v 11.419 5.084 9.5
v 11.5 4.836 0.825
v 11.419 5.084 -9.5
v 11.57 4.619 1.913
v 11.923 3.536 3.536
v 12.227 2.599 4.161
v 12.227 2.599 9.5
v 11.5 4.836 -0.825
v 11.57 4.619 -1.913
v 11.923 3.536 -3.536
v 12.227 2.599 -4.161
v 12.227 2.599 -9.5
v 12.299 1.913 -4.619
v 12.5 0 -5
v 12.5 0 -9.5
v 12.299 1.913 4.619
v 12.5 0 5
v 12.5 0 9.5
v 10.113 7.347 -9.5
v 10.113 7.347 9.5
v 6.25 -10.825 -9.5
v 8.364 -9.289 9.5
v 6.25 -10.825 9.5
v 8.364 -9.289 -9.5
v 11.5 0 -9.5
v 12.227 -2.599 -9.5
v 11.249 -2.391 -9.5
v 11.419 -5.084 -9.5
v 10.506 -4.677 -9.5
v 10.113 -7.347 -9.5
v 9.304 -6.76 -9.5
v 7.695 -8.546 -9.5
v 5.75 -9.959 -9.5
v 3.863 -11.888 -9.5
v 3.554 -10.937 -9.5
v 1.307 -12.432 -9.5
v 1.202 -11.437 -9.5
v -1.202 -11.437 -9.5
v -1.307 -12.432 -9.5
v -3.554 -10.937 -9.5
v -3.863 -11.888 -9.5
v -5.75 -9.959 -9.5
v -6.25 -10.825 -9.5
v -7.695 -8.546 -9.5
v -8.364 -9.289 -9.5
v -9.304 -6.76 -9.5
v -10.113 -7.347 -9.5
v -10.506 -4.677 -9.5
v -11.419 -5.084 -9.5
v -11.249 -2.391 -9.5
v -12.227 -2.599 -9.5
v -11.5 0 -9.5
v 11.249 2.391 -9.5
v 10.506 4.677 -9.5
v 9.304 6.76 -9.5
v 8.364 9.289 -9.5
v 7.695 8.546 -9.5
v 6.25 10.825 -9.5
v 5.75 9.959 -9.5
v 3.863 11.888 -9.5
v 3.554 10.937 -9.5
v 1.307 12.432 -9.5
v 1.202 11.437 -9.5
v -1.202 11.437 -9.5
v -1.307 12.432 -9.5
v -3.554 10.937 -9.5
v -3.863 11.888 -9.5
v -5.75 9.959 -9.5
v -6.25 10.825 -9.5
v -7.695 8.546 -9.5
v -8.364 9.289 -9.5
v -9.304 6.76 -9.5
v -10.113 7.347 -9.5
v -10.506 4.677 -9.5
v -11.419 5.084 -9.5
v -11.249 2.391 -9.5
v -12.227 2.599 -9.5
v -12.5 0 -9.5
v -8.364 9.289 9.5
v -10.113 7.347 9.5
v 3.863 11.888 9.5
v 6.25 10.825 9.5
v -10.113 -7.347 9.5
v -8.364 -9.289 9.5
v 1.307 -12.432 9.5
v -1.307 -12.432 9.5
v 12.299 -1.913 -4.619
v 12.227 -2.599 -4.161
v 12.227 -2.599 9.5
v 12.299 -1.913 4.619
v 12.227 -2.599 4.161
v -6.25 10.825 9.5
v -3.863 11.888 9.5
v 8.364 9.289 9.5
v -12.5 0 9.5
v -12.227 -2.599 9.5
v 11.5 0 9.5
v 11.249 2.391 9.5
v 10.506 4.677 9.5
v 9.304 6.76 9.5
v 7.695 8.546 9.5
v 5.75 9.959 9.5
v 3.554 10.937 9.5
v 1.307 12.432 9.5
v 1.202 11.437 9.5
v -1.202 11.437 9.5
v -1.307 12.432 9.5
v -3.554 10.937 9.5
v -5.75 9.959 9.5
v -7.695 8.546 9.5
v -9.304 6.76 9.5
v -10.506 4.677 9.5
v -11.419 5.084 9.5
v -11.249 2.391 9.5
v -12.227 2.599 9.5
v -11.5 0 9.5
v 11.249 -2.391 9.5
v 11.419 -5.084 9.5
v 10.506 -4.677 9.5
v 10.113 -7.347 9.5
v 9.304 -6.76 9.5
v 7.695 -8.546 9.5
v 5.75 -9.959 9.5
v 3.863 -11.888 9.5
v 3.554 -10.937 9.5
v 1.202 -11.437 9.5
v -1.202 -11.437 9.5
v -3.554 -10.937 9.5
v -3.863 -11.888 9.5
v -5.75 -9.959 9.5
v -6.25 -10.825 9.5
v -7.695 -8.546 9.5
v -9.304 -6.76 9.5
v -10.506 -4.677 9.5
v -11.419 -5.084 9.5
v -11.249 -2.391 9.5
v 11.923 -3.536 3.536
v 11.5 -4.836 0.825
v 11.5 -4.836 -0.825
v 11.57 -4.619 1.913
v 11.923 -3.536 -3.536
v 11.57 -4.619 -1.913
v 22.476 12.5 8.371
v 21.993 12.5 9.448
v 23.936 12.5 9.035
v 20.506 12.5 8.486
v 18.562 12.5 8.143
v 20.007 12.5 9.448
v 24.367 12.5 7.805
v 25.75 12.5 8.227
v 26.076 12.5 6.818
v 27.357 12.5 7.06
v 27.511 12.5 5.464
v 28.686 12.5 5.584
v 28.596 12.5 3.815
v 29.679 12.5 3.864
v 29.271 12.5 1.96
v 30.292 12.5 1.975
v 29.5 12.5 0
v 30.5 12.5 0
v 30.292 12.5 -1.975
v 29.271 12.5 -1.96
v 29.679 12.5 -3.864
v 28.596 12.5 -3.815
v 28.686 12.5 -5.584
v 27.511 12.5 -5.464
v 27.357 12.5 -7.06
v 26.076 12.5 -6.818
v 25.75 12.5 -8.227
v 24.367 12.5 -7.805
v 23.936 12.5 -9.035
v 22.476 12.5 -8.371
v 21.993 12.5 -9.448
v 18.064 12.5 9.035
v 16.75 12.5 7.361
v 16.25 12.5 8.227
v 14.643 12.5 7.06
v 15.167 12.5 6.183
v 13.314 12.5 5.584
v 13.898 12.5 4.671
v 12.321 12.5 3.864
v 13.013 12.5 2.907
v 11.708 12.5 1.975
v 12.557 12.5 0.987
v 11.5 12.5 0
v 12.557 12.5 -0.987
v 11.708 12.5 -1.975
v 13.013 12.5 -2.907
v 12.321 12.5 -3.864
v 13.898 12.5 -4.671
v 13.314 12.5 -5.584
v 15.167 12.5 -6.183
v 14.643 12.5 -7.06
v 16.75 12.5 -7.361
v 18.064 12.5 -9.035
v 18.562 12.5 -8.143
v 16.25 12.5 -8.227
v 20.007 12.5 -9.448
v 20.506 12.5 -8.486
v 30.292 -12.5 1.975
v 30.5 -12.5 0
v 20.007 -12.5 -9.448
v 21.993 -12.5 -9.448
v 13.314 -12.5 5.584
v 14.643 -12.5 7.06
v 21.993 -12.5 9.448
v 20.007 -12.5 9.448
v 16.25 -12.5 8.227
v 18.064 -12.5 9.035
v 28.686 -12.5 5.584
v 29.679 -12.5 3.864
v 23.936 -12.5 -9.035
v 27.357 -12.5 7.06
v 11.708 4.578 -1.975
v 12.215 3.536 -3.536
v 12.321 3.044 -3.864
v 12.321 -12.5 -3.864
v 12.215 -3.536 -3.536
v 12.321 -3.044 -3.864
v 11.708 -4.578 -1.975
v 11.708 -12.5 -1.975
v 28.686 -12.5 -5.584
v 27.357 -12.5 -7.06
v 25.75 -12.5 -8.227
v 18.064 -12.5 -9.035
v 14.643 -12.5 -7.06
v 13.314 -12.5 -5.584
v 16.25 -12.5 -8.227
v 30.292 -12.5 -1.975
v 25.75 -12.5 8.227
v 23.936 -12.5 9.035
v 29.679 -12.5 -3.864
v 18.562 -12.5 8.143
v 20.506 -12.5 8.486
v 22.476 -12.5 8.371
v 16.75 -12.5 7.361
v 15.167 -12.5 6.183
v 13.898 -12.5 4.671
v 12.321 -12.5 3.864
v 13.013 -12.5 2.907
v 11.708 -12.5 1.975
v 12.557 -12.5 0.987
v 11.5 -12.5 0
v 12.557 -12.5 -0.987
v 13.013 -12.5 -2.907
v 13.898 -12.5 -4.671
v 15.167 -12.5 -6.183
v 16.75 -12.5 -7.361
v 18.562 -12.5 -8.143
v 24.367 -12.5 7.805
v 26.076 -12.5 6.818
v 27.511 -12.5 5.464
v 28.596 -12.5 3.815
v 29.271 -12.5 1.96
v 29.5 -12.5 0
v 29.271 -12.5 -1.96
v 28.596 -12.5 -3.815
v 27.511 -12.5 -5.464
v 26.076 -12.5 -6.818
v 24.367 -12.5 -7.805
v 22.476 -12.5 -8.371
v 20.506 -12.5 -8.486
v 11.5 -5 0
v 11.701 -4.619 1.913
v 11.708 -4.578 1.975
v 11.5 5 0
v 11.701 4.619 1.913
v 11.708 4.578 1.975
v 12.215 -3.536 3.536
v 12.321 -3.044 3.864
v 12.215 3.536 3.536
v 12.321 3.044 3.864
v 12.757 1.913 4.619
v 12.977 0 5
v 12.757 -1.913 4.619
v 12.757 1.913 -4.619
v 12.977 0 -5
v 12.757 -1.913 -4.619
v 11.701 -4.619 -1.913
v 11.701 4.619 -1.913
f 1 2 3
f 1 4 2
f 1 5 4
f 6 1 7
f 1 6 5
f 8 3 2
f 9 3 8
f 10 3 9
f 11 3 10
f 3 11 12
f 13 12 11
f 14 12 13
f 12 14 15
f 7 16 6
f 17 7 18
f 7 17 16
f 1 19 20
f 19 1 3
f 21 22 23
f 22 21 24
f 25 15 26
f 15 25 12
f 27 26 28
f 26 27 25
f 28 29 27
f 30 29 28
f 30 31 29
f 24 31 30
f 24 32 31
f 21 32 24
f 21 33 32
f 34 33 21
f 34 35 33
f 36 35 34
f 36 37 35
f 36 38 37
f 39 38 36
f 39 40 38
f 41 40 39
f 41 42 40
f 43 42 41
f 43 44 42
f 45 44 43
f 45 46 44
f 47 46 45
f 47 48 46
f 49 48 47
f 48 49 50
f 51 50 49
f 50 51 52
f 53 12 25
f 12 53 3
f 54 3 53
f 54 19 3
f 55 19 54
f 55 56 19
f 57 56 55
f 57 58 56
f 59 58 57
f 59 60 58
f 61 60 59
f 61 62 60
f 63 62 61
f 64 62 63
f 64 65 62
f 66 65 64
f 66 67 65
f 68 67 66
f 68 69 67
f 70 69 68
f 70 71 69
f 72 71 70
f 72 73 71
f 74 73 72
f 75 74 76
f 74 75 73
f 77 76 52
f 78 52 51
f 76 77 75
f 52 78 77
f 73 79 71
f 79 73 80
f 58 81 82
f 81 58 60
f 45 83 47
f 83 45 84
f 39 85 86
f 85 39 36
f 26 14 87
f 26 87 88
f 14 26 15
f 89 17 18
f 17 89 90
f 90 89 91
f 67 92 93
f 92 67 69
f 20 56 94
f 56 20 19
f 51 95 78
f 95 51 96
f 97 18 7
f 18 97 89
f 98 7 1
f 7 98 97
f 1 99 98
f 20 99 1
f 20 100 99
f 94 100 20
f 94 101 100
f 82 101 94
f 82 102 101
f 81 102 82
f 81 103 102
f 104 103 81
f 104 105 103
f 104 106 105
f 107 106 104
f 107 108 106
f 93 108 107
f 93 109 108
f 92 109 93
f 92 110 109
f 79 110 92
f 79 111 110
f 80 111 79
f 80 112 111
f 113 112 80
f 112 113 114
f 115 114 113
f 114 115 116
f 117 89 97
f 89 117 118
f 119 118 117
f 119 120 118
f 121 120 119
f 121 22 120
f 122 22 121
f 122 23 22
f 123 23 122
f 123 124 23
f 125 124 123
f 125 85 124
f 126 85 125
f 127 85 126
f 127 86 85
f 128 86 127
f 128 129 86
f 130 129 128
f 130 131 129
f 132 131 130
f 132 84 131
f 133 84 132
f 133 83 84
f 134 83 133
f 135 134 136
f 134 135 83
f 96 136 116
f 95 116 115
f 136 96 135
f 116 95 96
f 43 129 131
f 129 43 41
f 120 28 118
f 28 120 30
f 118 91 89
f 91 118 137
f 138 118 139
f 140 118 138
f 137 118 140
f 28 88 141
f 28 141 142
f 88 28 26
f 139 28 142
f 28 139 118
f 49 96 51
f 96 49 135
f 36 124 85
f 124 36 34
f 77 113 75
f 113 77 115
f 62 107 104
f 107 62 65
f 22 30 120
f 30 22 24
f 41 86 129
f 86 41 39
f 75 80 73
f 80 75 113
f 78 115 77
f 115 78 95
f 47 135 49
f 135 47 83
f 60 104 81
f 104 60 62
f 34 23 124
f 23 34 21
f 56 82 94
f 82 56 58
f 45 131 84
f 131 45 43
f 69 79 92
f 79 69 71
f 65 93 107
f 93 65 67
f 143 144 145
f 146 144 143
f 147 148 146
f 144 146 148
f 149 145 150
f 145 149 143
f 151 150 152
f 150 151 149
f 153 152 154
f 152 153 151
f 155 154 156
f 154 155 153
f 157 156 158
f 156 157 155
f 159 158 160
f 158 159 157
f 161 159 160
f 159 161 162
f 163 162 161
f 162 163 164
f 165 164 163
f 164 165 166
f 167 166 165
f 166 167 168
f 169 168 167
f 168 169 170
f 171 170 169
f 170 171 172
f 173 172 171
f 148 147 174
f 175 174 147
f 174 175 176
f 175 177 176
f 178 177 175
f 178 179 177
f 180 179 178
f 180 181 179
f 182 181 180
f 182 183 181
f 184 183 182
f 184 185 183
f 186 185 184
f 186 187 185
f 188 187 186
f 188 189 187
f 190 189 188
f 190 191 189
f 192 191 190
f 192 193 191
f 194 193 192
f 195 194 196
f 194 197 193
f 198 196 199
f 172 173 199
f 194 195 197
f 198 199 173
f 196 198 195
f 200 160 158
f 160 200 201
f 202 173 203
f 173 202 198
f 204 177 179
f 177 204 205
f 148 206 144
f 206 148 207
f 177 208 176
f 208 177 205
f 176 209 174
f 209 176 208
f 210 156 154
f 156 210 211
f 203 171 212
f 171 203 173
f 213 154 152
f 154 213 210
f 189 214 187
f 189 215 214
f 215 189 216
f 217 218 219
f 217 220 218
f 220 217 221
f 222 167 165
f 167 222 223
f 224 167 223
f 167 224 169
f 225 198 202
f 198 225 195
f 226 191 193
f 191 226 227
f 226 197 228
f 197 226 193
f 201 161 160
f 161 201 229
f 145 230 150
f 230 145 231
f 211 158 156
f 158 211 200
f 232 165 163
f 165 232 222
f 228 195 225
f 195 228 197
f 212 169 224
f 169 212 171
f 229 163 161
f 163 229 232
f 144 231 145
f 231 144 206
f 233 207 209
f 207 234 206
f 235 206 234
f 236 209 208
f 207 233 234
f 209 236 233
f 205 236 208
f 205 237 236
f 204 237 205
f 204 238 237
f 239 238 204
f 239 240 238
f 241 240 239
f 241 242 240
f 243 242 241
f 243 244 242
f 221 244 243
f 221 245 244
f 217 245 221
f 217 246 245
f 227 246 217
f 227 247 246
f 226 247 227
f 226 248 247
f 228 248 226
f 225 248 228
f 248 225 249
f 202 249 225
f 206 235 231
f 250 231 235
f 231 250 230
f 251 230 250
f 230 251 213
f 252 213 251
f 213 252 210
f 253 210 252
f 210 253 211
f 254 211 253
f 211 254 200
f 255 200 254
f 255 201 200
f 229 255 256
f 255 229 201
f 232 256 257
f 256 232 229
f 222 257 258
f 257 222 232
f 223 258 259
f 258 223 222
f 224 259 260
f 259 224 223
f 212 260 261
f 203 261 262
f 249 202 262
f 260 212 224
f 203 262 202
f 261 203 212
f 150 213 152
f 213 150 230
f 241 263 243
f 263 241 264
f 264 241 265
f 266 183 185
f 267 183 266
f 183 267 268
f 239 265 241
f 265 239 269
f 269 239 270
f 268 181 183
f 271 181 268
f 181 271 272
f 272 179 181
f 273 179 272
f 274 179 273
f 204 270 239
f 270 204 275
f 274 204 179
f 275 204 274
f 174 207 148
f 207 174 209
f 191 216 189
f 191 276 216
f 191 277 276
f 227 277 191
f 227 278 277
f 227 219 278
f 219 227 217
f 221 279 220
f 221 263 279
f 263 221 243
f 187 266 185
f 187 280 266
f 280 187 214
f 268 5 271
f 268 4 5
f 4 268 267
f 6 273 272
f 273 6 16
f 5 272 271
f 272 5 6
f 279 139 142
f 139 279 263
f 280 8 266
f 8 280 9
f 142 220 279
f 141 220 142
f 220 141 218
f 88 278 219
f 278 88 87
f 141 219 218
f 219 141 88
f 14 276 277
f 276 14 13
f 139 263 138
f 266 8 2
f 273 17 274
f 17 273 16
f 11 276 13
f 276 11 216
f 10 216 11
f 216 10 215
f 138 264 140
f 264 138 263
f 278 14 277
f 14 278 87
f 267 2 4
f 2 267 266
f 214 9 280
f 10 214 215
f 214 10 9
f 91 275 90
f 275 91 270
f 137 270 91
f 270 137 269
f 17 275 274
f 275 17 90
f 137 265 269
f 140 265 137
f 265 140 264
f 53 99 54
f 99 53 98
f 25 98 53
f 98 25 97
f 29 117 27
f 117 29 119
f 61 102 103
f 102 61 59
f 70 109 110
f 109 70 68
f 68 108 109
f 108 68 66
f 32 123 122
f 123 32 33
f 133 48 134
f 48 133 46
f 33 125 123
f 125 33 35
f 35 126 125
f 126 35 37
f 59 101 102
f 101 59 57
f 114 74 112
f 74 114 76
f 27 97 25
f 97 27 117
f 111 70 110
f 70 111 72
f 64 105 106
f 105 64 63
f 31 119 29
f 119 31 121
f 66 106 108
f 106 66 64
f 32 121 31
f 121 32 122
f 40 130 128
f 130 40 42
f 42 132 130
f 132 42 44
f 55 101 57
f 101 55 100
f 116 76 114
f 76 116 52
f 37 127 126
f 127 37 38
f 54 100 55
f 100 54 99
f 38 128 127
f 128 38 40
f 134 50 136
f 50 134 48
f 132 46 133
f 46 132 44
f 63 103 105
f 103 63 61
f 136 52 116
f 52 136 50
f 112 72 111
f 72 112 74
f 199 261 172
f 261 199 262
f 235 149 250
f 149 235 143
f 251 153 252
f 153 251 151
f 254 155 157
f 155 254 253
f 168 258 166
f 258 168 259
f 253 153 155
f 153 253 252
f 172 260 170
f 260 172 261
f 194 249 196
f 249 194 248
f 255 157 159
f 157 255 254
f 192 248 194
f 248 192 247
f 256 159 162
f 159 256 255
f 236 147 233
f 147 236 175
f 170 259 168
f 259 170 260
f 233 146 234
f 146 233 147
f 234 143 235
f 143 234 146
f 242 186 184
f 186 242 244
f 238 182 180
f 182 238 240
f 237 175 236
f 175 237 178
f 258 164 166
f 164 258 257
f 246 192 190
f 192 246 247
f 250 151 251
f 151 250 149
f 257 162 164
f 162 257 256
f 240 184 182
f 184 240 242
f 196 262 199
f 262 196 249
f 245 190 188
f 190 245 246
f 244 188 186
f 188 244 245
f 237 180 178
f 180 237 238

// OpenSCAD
// OpenSCAD Drumstick Fulcrum Hold

// Finger Size
fs =22;

// Ring Width
rw = 10;

// Wiggle Room
wiggle = 1;

// Stick Diameter
d = 16;

// Constants

rt = 2;

// Defaults to Vic Firth 2Bs

// Finger Ring


difference(){
    union(){
        cylinder(h=d+wiggle+rt, d=fs+wiggle+rt, center=true);
        translate([d/2+fs/2+rt, 0, 0])rotate([90, 0, 0])
        cylinder(h=fs+wiggle+rt, d=d+wiggle+rt, center=true);
        translate([(fs+wiggle)/2, 0, 0])rotate([0, 90, 0])cylinder(h=rt, d=rw);
    }
    cylinder(h=d+wiggle+rt+2, d=fs+wiggle, center=true);
    translate([d/2+fs/2+rt, 0, 0])rotate([90, 0, 0])
    cylinder(h=fs+wiggle+rt+2, d=d+wiggle, center=true);
}
